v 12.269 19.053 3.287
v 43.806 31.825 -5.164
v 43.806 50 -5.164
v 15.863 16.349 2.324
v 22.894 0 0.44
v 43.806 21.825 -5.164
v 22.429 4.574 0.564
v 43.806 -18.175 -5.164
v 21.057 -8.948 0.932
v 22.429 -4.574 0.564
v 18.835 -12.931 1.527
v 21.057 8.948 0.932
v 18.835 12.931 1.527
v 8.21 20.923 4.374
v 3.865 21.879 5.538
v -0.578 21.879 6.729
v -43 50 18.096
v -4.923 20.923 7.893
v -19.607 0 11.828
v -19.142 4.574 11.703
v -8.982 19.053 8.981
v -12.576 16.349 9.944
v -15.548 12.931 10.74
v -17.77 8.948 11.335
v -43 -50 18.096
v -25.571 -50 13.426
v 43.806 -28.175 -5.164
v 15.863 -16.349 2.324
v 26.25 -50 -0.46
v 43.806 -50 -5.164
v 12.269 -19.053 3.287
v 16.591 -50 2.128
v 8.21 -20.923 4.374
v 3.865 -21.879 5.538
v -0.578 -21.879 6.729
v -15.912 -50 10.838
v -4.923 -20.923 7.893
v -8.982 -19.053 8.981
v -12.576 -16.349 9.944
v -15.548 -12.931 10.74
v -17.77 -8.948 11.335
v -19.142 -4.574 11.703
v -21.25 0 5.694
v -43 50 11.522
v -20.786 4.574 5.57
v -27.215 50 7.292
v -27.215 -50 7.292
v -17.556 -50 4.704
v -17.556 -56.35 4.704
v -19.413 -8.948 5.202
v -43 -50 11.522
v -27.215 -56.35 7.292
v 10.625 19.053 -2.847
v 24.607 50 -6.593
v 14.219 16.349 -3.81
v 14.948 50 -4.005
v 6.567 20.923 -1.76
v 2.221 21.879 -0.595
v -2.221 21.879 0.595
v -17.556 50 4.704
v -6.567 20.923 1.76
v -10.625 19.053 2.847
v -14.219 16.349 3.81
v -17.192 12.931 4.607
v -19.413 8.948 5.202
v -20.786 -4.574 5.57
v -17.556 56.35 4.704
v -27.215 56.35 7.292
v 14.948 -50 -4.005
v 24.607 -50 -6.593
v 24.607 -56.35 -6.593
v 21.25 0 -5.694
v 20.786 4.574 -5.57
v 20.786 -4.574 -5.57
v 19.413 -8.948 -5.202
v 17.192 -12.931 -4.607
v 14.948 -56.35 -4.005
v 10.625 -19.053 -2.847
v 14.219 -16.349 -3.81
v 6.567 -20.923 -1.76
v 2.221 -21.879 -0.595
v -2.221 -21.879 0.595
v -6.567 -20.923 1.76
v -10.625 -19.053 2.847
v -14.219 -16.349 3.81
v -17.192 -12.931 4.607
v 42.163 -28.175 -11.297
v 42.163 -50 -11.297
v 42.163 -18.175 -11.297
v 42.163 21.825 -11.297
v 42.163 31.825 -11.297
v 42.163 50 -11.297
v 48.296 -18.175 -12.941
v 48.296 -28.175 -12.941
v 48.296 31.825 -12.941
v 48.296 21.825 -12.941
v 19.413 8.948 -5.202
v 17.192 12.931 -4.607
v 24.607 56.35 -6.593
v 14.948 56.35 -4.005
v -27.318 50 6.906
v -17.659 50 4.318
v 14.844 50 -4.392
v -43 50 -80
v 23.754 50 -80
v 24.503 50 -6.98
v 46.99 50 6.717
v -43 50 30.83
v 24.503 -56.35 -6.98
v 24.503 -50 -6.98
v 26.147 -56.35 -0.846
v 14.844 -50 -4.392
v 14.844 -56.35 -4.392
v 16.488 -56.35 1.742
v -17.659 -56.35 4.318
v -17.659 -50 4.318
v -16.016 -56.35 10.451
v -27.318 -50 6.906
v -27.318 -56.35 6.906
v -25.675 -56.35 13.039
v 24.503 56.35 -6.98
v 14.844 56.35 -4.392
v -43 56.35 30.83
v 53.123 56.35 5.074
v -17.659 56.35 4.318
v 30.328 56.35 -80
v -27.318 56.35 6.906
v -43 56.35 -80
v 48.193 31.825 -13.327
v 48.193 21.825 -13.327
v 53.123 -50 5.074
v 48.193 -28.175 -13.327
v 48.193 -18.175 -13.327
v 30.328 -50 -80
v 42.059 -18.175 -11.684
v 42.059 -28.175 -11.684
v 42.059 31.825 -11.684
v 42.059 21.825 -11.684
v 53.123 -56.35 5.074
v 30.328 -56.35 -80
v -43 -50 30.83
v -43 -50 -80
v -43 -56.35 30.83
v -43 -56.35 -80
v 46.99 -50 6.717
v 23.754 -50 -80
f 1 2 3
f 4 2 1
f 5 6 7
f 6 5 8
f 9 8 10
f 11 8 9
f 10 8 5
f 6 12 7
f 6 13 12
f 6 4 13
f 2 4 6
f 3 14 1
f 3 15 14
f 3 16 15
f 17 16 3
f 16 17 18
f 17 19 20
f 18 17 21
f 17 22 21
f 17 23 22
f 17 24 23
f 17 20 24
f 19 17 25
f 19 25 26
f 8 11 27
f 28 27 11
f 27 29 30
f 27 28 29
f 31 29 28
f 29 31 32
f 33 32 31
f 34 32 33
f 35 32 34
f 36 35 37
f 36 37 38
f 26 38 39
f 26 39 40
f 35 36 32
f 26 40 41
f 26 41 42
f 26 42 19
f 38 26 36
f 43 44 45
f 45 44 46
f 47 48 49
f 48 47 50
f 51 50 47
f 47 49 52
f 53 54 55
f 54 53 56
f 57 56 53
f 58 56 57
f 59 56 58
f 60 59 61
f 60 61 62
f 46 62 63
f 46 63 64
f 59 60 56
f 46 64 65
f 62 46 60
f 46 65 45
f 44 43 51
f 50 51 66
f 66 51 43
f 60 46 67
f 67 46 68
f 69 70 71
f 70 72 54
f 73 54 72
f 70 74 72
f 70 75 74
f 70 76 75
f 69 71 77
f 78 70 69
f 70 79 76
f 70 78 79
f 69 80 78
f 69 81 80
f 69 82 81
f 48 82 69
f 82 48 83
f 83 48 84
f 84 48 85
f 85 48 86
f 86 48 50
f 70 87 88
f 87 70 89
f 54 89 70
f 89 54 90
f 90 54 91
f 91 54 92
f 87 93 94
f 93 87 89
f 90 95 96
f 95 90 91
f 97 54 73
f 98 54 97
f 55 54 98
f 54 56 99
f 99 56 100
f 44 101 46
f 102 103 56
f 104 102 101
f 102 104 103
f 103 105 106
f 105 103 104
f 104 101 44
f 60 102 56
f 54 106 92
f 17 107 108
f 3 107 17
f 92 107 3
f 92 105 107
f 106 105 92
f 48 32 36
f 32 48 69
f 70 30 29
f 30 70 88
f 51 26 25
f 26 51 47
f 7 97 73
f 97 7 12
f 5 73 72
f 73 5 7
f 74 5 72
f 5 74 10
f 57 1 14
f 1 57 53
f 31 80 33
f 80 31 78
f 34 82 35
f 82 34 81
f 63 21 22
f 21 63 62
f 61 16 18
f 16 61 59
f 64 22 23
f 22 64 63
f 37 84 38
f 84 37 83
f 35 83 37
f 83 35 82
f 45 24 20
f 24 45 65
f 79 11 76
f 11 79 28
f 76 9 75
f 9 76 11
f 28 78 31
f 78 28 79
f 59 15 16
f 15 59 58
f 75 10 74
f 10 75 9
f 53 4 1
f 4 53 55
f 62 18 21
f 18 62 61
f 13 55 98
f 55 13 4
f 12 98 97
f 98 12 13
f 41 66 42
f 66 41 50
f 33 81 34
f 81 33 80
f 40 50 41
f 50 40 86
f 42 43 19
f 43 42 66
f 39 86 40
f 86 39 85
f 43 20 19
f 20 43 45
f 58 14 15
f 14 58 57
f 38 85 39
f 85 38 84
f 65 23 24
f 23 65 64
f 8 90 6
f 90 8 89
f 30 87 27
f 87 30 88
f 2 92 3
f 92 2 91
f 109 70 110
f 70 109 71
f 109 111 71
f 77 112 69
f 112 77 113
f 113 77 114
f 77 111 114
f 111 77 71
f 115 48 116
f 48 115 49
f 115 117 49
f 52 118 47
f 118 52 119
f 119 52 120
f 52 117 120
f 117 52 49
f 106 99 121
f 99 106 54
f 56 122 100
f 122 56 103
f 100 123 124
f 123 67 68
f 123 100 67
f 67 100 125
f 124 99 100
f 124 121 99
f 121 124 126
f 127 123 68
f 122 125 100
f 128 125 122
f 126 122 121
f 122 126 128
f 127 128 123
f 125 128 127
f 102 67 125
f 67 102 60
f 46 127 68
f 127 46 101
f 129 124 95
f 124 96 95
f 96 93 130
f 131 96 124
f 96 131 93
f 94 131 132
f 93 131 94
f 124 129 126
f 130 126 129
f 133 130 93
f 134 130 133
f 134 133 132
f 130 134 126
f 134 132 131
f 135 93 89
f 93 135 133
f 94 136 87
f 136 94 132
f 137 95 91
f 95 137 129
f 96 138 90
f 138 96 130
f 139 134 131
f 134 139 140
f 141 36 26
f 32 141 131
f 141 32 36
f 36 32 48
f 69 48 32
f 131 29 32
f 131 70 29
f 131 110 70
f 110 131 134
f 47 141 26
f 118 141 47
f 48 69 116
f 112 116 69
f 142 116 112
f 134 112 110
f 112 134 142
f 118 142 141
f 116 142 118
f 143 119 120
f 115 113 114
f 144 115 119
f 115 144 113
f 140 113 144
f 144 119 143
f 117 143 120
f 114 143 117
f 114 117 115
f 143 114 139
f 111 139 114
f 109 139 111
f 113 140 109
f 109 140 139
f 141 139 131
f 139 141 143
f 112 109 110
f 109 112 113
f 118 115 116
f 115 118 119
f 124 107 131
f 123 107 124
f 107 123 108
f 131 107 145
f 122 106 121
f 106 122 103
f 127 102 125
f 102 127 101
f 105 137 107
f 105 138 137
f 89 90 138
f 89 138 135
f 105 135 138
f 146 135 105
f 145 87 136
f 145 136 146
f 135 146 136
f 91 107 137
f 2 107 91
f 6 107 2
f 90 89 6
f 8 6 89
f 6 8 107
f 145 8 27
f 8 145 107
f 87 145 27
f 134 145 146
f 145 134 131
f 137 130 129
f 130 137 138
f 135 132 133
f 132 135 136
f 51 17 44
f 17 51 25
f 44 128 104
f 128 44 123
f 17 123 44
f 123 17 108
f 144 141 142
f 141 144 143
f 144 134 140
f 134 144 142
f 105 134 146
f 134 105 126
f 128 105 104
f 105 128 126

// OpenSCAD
	module assembled(){
////////////////////////////////////
partOne();
////////////////////////////////////
translate([0,-50-6.35,-25-6.35])
rotate([-90,0,0])
partTwo();
//////////////////////////////////////

translate([0,50,-25-6.35])
rotate([-90,0,0])
partTwo();


//////////////////////////////////////
translate([+50,0,-25-6.35])
rotate([-90,0,90])
partThree();

//////////////////////////////////////
}



difference(){
rotate([0,15,0])
assembled();


translate([-243,-200/2,-200/2-10], center=true)
cube([100*2, 100*2,100*2]);

translate([-50,-200/2,-280], center=true)
cube([100*2, 100*2,100*2]);

}



///////////////////////////////////////////////////////////////////////////
module partOne(){
	translate([-6.35/2+25-6.35,-50+-6.35,0], center=true)
		cube([10,6.35,6.35]);
	
	translate([-6.35/2-25,-50+-6.35,0], center=true)
		cube([10,6.35,6.35]);

	translate([-6.35/2+25-6.35,50,0], center=true)
		cube([10,6.35,6.35]);

	translate([-6.35/2-25,50,0], center=true)
		cube([10,6.35,6.35]);

	translate([50-6.35,-6.35/2-25,0], center=true)
		cube([6.35,10,6.35]);

	translate([50-6.35,-6.35/2+25,0], center=true)
		cube([6.35,10,6.35]);

difference(){
	translate([-50,-50,0], center=true)
		cube([100,100,6.35]);

	translate([0,0,-6.35], center=true)
		cylinder(r=22, h=20);
	
	translate([50-6.35,-50-1,-1], center=true)
		cube([100,100+2,6.35+2]);
}
}
/////////////////////////////////////////////////////////////////////////
module partTwo(){

difference(){
	translate([-50,-50,0], center=true)
		cube([100,110,6.35]);

	translate([-6.35/2+25-6.35,-50+6.35*2,-1], center=true)
		cube([10,6.35,6.35+2]);

	translate([-6.35/2-25,-50+6.35*2,-1], center=true)
		cube([10,6.35,6.35+2]);
}
}
/////////////////////////////////////////////////////////////////////////
module partThree(){

difference(){
	translate([-50,-50,0], center=true)
		cube([100,110,6.35]);

	translate([-6.35/2+25,-50+6.35*2,-1], center=true)
		cube([10,6.35,6.35+2]);

	translate([-6.35/2-25,-50+6.35*2,-1], center=true)
		cube([10,6.35,6.35+2]);
}
}
///////////////////////////////////////////////////////////////////////////

	
